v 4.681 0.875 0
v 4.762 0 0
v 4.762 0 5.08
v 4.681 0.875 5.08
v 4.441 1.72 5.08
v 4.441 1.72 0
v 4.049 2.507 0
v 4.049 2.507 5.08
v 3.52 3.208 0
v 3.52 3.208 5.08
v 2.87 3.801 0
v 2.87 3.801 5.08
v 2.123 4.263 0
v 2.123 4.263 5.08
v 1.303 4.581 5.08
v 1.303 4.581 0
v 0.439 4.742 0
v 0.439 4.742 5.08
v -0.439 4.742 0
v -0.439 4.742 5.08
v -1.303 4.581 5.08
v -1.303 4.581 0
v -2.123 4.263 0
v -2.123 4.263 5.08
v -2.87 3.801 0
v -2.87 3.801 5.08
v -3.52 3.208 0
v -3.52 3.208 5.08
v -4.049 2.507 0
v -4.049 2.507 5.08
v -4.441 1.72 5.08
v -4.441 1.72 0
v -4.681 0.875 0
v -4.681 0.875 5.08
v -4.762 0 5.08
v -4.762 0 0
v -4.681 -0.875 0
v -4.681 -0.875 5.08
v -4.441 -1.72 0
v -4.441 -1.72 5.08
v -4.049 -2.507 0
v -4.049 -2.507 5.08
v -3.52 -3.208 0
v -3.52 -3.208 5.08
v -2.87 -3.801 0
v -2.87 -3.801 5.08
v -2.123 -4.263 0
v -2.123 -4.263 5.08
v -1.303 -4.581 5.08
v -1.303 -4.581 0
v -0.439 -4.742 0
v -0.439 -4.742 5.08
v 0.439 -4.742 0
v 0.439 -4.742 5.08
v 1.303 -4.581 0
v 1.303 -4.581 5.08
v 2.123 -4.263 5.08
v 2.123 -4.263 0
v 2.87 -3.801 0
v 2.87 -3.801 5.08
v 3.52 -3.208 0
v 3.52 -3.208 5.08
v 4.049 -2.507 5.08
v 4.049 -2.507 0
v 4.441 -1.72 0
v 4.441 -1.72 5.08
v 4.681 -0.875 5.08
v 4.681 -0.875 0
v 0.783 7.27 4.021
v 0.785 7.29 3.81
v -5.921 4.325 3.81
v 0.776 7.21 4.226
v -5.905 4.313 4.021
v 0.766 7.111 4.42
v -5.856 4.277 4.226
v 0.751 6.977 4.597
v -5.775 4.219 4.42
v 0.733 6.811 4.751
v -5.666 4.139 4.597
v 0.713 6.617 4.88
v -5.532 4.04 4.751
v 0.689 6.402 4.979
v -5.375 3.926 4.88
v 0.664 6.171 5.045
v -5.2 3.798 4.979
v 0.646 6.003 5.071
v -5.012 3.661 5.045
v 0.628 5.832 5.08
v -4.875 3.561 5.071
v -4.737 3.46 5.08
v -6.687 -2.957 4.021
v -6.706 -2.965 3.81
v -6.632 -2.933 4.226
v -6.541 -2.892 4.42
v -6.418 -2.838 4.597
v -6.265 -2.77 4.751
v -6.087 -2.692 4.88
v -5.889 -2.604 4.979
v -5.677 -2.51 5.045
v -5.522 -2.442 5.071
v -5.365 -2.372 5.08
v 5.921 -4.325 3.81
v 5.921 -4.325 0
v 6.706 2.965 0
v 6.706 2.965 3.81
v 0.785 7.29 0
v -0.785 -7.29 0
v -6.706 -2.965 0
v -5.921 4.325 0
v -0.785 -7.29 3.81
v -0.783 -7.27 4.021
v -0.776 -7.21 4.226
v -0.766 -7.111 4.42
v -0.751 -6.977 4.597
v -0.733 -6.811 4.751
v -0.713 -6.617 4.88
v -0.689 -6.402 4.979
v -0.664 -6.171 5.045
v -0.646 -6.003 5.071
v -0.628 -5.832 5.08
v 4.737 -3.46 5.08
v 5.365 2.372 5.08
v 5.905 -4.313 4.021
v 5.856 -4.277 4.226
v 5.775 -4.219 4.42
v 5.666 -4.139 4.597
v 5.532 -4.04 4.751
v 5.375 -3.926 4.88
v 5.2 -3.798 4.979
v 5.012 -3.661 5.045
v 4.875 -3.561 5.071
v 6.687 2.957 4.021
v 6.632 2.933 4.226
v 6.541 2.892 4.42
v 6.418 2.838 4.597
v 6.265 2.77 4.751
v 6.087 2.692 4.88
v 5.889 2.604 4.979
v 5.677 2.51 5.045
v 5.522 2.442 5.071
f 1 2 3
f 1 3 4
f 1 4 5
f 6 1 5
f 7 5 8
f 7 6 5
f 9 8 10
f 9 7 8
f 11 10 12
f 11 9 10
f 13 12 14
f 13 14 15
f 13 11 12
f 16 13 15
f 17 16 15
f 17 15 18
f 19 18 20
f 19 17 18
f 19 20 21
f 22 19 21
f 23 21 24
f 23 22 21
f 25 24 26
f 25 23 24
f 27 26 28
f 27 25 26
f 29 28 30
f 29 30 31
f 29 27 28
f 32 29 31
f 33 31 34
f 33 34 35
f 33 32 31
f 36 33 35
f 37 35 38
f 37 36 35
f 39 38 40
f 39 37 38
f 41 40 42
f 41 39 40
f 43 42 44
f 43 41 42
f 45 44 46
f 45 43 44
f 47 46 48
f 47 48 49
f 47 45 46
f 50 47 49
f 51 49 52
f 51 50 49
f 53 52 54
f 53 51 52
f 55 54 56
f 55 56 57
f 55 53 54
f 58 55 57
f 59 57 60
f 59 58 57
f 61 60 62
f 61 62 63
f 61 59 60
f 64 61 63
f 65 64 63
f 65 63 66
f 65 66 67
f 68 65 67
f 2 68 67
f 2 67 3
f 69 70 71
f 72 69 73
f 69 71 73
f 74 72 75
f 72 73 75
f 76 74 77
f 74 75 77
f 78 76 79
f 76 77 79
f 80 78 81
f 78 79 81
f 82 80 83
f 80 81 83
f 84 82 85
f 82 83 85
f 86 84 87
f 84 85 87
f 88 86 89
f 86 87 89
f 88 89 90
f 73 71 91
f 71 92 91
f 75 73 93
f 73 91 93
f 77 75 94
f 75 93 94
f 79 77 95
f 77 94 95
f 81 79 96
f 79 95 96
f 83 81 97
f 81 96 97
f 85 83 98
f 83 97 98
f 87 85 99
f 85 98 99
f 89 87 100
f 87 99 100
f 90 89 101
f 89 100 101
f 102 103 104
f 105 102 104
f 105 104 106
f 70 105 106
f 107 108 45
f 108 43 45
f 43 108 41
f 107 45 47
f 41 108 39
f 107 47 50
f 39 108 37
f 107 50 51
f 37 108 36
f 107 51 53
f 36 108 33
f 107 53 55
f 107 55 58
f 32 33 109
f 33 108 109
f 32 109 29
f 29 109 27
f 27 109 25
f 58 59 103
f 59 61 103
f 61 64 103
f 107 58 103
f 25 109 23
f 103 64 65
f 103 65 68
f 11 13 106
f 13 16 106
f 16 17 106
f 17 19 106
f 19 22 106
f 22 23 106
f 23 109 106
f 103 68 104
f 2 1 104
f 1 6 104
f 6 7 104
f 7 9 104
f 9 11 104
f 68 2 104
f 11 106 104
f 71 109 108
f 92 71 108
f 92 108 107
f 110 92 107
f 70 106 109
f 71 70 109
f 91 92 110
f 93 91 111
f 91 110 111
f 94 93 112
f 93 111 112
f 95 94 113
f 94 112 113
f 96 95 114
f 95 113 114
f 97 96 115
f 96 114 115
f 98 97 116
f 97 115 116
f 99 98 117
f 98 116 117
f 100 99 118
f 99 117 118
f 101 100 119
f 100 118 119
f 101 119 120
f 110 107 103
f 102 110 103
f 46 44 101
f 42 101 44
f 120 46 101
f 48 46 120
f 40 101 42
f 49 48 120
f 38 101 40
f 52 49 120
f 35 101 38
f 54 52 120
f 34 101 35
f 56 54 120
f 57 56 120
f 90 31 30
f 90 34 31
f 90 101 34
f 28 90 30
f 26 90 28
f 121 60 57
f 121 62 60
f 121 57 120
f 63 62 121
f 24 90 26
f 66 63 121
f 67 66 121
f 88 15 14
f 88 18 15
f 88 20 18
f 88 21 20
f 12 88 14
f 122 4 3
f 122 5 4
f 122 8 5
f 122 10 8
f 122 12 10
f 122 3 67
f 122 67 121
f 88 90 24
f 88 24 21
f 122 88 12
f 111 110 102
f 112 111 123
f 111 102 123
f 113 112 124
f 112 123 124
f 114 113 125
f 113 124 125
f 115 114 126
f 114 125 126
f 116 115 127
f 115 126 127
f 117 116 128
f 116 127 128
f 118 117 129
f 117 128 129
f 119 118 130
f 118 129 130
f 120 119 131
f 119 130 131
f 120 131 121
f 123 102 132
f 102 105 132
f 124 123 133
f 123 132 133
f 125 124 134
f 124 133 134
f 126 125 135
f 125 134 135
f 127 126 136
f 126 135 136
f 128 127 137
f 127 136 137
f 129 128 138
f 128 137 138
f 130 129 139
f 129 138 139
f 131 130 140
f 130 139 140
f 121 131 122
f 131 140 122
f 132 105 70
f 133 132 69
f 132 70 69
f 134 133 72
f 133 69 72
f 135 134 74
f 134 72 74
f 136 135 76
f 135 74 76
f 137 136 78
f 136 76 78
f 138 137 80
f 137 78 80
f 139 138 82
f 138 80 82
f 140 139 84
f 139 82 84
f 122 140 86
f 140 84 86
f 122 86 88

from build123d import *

# Parameters (mm, degrees)
SKETCH1_R           = 4.7625
BOSS_EXTRUDE1_DEPTH = 5.08
FILLET1_R           = 1.27


with BuildPart() as part:
    # Sketch1 → Boss-Extrude1 (new body)
    with BuildSketch(Plane.XY):
        Polygon((6.705982891, 2.965320691), (0.784948396, 7.290211886), (-5.921034494, 4.324891195), (-6.705982891, -2.965320691), (-0.784948396, -7.290211886), (5.921034494, -4.324891195), align=None)
        Circle(SKETCH1_R, mode=Mode.SUBTRACT)
    extrude(amount=BOSS_EXTRUDE1_DEPTH)

    # Fillet1
    fillet1_edges = [part.edges().sort_by_distance(p)[0] for p in [
        (-2.568043049, 5.807551541, 5.08),
        (-6.313508693, 0.679785252, 5.08),
        (-3.745465644, -5.127766289, 5.08),
        (2.568043049, -5.807551541, 5.08),
        (6.313508693, -0.679785252, 5.08),
        (3.745465644, 5.127766289, 5.08),
    ]]
    fillet(fillet1_edges, radius=FILLET1_R)


solid = part.part
